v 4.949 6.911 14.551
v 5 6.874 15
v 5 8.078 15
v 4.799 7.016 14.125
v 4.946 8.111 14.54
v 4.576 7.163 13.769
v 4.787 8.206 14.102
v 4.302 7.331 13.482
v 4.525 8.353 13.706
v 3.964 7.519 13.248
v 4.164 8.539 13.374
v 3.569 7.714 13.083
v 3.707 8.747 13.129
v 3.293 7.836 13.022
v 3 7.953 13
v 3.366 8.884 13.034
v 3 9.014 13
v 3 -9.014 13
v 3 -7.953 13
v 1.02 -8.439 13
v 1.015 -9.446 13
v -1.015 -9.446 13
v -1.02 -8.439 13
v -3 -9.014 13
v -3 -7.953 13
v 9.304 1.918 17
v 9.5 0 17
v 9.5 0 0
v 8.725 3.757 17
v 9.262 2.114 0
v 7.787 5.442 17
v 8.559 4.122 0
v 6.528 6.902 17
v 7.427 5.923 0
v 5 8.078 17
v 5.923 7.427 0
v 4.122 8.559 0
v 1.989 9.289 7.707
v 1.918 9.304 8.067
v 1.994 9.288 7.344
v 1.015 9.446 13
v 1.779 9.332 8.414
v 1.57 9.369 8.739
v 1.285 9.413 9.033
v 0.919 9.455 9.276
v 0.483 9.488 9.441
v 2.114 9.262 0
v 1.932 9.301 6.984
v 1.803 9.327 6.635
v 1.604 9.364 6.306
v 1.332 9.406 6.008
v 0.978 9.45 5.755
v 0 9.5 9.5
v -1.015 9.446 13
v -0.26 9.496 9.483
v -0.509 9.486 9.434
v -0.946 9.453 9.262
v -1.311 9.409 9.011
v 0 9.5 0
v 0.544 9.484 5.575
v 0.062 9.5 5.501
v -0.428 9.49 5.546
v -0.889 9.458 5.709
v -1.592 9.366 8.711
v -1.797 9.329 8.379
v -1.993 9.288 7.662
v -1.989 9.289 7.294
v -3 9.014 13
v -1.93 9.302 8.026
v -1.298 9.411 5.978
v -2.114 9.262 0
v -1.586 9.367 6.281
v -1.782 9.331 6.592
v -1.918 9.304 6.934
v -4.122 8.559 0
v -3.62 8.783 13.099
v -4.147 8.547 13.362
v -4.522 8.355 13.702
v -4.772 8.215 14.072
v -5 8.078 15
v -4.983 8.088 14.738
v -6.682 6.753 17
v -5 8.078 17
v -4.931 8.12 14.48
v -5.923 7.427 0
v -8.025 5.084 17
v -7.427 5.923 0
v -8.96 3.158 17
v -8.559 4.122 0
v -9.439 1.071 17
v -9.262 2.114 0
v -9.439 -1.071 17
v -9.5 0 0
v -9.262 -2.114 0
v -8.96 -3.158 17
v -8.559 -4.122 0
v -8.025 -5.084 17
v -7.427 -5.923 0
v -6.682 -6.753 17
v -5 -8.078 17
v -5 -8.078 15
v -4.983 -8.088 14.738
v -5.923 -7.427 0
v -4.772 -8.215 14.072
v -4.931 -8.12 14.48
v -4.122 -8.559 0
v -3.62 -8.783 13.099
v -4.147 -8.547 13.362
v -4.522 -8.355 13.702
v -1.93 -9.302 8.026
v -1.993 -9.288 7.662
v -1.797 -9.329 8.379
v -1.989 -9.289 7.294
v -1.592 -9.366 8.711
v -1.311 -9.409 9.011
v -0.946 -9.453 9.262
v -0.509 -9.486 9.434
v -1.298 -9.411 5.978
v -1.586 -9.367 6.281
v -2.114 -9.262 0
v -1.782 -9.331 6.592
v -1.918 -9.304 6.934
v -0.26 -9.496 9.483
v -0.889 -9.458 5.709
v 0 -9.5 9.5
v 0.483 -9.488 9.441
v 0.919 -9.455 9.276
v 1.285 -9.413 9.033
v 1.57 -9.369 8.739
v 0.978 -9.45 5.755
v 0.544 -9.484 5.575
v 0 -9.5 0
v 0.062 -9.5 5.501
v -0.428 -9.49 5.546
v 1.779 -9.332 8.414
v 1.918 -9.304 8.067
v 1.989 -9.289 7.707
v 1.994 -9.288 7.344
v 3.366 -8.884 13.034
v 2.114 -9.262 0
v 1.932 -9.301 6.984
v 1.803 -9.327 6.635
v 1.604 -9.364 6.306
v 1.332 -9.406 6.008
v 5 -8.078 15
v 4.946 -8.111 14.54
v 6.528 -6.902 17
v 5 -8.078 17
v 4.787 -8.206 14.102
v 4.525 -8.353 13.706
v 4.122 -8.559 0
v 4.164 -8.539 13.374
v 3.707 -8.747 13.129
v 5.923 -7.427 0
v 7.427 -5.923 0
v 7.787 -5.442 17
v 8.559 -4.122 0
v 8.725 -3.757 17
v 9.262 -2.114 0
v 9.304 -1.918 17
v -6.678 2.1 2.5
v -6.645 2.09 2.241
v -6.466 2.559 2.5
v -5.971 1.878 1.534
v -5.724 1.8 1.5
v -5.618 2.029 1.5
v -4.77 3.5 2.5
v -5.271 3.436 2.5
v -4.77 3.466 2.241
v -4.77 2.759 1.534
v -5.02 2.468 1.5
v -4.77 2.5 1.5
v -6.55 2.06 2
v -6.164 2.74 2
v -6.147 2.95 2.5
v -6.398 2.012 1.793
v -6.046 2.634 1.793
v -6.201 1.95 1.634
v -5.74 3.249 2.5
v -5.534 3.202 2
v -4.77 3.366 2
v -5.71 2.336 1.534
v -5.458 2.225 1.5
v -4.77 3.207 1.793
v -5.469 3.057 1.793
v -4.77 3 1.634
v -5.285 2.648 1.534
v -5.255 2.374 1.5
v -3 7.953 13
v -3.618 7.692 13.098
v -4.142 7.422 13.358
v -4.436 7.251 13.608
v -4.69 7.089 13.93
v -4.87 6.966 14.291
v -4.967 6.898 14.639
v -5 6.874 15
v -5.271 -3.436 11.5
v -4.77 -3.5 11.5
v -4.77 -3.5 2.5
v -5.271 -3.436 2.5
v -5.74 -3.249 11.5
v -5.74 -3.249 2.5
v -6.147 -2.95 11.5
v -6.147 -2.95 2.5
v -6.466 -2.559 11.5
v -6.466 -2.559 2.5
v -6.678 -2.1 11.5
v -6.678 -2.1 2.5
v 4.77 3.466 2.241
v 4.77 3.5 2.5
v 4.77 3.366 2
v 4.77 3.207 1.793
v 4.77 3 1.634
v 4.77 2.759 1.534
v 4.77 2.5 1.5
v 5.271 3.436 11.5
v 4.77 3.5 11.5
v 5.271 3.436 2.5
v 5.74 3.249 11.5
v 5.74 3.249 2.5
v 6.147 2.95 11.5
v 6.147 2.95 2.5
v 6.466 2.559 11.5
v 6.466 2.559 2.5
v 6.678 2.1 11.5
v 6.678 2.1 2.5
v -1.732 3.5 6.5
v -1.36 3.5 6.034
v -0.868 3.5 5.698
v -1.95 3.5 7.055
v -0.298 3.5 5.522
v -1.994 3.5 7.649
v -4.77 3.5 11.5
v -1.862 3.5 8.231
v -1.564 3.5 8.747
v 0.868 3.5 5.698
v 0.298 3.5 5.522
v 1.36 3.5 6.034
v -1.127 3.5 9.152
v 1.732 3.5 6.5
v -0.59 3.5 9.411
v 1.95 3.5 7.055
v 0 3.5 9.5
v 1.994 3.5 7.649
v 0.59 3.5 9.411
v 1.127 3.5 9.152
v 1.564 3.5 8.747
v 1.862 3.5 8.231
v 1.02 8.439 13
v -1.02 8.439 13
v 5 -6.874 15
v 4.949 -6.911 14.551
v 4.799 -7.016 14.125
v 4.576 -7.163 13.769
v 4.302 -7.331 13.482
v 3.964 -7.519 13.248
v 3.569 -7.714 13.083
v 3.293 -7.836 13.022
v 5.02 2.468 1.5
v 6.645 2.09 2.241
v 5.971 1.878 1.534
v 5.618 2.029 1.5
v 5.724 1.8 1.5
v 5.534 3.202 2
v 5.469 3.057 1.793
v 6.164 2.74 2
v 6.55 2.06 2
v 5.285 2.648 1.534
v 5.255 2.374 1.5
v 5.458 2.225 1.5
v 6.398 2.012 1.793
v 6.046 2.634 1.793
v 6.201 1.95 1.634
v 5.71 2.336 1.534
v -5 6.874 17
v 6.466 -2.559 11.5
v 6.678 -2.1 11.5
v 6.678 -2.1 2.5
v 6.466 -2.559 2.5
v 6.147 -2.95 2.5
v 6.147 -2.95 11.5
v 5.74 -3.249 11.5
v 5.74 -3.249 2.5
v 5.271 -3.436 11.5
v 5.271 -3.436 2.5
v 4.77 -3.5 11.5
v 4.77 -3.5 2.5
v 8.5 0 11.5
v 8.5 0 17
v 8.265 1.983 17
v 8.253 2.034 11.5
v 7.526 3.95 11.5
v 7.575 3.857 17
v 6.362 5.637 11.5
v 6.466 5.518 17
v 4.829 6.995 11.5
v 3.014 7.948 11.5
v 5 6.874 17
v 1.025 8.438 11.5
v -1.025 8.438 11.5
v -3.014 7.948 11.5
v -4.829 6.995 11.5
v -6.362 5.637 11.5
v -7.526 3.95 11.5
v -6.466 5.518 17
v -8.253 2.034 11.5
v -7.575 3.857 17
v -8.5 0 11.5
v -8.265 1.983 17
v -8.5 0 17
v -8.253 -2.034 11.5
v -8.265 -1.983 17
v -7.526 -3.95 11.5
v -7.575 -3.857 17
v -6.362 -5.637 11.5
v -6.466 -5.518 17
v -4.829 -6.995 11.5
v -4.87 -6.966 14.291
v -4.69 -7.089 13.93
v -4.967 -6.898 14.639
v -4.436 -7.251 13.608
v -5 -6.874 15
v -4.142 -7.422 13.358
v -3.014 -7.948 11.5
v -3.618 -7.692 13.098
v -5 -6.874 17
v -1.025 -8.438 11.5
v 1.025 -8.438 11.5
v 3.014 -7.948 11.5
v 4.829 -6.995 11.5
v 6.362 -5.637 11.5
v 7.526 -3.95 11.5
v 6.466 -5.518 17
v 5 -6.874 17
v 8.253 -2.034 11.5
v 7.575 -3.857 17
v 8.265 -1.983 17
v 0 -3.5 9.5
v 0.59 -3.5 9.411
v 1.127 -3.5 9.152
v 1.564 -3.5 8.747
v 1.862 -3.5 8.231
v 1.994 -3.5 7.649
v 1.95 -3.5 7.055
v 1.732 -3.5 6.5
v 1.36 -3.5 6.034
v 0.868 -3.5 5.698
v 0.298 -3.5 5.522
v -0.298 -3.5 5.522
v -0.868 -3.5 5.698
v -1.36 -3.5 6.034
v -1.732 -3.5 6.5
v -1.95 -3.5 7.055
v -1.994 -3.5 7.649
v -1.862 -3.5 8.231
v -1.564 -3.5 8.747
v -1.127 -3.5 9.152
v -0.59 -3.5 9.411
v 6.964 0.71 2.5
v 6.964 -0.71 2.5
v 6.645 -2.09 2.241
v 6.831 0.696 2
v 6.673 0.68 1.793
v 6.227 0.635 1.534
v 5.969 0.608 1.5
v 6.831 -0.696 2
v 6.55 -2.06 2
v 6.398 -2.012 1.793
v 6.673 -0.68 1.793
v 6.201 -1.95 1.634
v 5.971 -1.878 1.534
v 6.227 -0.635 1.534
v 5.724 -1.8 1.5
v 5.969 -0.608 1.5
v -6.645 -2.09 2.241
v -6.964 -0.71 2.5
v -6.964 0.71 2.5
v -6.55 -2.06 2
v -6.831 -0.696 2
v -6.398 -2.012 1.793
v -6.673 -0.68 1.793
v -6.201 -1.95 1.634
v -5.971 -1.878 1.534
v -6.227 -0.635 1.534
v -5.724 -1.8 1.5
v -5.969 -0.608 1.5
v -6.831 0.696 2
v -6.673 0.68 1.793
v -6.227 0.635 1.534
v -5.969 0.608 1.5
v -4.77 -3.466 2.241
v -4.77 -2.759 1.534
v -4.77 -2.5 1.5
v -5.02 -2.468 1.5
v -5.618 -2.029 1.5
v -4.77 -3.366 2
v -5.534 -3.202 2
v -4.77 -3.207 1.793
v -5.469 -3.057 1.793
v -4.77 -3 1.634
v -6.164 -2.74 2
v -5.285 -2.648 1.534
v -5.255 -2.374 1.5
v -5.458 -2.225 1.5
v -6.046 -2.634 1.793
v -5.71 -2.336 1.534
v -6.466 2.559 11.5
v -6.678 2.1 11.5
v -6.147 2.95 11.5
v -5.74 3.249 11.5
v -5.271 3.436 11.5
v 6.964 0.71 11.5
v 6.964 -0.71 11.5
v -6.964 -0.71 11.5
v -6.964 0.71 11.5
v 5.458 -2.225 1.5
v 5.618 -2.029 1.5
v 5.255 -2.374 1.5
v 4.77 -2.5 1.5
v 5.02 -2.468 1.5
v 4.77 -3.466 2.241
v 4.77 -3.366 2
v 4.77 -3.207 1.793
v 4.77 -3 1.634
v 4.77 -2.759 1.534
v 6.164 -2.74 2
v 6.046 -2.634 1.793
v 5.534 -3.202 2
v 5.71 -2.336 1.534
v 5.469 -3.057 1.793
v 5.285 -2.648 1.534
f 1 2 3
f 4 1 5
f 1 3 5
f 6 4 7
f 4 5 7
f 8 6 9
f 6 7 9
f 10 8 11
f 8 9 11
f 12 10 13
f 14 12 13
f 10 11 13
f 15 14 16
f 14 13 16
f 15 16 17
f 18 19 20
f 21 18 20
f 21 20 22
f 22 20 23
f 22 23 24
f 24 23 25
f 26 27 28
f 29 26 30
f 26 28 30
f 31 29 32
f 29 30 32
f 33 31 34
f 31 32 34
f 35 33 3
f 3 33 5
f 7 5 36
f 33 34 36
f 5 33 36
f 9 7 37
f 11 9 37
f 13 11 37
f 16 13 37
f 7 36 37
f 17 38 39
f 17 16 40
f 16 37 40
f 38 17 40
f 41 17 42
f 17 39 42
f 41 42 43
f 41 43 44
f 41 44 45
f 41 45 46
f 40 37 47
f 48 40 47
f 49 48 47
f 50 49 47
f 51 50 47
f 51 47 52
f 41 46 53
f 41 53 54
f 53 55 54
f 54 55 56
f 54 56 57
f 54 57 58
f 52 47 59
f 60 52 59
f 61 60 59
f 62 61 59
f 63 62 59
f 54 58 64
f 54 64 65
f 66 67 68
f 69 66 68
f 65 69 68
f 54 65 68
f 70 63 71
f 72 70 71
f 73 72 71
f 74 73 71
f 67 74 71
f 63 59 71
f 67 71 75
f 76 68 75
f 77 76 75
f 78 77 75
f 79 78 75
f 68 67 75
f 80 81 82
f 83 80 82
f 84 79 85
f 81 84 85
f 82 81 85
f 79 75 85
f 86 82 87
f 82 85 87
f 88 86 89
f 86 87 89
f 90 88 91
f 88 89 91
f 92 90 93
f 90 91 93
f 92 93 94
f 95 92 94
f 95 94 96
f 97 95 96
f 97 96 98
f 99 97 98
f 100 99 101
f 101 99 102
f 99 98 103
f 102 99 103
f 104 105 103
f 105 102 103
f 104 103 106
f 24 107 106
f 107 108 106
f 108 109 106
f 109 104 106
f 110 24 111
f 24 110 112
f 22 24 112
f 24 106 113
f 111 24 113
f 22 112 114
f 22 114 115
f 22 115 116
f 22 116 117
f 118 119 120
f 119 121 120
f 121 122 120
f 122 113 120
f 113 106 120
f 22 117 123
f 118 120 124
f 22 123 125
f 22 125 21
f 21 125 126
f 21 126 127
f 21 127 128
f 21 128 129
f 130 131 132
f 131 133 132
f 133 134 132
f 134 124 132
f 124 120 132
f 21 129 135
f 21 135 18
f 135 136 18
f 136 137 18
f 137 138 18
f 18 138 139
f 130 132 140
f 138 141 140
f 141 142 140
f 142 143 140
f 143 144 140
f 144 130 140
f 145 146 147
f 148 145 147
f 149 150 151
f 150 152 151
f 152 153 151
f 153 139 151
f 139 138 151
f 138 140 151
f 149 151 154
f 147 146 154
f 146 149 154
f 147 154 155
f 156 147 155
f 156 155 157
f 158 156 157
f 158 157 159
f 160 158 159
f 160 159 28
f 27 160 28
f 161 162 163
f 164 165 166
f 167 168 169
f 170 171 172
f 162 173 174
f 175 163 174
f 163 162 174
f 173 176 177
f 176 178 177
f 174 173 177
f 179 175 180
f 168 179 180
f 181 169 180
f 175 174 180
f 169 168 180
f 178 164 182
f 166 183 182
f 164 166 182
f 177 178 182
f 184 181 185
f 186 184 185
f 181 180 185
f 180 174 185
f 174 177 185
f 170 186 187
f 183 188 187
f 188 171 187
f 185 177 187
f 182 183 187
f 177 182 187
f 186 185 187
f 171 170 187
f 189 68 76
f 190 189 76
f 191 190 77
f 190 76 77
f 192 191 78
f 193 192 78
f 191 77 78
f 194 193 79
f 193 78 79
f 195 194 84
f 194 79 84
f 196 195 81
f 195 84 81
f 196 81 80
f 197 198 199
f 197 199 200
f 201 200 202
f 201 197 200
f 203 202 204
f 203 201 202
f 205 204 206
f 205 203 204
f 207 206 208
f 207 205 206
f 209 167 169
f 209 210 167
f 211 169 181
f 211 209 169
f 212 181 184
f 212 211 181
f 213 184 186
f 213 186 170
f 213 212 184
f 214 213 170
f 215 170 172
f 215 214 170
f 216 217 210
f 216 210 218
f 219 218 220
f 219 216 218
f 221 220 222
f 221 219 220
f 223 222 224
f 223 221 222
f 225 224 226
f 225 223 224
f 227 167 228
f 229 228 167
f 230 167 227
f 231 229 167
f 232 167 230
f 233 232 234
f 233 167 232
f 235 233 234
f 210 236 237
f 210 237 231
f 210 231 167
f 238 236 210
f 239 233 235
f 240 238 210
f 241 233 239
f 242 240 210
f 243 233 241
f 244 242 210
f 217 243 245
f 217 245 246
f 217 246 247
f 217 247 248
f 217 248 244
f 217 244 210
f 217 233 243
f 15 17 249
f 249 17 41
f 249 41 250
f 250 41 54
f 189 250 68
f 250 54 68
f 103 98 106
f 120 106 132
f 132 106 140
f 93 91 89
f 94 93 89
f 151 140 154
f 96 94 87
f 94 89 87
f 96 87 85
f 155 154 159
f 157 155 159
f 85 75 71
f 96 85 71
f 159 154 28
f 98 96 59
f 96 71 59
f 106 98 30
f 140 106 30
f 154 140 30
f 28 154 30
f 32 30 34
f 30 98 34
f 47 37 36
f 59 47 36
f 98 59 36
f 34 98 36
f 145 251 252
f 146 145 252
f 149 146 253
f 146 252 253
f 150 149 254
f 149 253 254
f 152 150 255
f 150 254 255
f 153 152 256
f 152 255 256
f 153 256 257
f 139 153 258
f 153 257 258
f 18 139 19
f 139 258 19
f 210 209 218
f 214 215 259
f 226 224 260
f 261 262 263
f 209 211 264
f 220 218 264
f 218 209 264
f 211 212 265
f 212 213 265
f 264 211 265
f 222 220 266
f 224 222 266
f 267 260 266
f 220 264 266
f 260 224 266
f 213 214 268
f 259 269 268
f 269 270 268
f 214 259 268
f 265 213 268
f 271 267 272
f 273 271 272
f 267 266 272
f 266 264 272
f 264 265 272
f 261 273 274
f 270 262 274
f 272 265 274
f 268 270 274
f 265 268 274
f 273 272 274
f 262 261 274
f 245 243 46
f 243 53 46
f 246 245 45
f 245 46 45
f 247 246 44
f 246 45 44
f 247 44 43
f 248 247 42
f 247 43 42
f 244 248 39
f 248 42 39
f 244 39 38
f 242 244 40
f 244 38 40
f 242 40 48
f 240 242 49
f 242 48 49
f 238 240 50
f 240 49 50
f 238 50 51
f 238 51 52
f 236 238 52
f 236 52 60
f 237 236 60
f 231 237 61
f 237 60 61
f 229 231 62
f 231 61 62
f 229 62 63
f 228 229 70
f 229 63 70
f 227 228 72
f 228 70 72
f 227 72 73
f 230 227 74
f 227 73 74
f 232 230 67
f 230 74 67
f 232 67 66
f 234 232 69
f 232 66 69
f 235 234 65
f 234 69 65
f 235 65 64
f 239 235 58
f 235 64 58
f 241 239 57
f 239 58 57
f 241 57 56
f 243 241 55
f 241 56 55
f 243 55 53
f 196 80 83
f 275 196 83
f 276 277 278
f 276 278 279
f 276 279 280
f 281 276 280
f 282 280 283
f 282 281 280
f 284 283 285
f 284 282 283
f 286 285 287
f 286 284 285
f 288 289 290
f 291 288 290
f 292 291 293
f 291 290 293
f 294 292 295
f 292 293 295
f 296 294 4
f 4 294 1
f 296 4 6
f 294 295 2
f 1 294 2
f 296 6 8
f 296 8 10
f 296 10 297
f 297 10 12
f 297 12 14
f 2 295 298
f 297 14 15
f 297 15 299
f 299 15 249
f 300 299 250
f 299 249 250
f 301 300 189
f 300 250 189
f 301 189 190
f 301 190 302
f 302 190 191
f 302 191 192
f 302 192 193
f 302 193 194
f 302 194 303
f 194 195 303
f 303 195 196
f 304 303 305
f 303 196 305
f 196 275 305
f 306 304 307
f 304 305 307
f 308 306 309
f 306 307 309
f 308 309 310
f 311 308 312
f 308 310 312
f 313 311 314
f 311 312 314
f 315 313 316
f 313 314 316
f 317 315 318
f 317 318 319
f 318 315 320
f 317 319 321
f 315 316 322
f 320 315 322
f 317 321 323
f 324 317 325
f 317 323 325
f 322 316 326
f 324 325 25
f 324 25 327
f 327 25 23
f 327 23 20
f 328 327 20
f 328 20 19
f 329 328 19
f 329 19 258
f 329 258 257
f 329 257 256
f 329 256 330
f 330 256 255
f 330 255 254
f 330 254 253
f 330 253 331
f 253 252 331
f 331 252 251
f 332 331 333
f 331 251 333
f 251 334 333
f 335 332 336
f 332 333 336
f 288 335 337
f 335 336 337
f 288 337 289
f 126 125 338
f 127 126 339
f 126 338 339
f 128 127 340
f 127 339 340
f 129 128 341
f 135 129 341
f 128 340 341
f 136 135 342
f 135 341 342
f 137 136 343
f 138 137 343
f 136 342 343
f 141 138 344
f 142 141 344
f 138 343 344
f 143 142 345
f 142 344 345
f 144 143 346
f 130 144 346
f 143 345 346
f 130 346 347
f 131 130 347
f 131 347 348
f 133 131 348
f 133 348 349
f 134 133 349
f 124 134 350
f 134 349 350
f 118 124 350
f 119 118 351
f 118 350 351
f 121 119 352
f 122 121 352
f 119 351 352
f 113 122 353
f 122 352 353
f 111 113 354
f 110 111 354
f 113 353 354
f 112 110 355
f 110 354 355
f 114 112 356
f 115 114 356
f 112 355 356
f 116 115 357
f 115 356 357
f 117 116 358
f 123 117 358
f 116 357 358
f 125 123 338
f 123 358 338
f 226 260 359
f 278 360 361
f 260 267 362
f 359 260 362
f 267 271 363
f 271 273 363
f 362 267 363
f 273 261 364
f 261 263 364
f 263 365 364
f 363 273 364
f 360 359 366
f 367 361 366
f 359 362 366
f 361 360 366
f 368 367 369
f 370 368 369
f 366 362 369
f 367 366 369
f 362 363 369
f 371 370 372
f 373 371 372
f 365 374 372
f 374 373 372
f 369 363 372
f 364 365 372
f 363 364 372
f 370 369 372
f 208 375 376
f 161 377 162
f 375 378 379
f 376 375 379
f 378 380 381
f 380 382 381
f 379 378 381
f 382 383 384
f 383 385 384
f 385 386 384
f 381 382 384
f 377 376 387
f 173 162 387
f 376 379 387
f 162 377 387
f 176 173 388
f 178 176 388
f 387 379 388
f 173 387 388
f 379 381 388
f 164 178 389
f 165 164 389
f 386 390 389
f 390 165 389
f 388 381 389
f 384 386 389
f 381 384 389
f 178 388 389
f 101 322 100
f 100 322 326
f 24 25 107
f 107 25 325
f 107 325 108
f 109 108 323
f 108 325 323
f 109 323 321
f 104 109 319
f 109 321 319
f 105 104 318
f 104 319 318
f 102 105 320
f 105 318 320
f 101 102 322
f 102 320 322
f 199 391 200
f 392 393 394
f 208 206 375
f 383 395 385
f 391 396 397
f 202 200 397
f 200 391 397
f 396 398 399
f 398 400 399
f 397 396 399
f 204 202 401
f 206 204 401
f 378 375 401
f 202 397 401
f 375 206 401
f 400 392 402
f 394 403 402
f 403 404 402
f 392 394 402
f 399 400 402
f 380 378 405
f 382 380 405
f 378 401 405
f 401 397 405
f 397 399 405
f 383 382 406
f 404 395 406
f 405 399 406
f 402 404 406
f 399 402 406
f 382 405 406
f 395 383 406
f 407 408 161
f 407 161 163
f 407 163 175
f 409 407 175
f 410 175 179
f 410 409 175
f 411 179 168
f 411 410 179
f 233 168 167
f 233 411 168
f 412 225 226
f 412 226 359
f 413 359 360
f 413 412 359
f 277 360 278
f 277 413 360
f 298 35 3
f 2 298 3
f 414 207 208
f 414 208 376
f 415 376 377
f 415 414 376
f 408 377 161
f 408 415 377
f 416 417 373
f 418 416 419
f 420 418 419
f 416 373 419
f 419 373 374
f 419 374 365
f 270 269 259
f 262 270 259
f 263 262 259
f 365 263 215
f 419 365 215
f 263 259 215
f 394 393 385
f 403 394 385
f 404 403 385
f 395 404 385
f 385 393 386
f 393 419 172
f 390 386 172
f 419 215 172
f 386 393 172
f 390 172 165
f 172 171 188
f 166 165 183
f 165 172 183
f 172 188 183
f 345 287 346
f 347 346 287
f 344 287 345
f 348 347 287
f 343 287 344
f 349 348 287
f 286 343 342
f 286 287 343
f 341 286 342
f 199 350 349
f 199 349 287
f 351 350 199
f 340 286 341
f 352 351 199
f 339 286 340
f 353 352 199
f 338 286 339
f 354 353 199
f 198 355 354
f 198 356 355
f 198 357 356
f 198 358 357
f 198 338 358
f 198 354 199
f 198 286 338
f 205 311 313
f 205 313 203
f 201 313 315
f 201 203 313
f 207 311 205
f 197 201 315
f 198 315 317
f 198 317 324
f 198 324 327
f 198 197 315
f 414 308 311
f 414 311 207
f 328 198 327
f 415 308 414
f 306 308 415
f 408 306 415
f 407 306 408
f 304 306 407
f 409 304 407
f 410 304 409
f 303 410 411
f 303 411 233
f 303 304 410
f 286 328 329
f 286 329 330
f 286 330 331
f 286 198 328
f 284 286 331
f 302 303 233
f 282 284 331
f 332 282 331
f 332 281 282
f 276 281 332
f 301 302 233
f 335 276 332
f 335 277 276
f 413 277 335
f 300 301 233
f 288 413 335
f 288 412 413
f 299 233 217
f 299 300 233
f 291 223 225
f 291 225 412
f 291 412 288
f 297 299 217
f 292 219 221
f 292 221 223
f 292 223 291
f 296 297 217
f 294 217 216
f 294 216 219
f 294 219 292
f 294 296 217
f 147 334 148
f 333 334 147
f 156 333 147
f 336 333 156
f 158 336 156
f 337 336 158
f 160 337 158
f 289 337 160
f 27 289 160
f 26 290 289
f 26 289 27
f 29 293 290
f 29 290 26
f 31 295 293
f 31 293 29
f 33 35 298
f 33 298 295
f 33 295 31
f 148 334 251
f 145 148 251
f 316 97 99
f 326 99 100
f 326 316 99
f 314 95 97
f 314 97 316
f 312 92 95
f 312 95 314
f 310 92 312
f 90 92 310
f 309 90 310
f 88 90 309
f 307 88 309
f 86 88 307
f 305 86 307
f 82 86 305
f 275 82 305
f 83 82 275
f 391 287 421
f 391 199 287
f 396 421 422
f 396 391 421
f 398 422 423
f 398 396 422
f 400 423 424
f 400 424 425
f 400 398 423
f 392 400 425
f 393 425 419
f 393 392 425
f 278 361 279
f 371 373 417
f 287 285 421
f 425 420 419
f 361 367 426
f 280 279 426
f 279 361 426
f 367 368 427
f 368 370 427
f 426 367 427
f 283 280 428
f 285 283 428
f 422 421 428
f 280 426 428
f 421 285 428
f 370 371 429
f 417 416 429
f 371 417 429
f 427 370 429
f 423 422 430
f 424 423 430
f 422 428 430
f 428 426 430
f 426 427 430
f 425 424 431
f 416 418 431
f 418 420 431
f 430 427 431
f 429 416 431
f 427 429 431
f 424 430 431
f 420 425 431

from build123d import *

# Parameters (mm, degrees)
ESQUISSE1_R             = 9.5
BASE_EXTRUSION_DEPTH    = 17
ESQUISSE2_R             = 8.5
ENL_V_MAT_EXTRU_1_DEPTH = 5.5
ESQUISSE3_R             = 2
ENL_V_MAT_EXTRU_2_DEPTH = 15
ENL_V_MAT_EXTRU_3_DEPTH = 10
CONG_1_R                = 1


with BuildPart() as part:
    # Esquisse1 → Base-Extrusion (new body)
    with BuildSketch(Plane.XY):
        Circle(ESQUISSE1_R)
    extrude(amount=BASE_EXTRUSION_DEPTH)

    # Esquisse2 → Enlèv. mat.-Extru.1 (cut)
    with BuildSketch(Plane.XY.offset(17)):
        Circle(ESQUISSE2_R)
    extrude(amount=-ENL_V_MAT_EXTRU_1_DEPTH, mode=Mode.SUBTRACT)

    # Esquisse3 → Enlèv. mat.-Extru.2 (cut, symmetric)
    with BuildSketch(Plane(origin=(0, 0, 0), x_dir=(1, 0, 0), z_dir=(0, 1, 0))):
        with Locations(Location((0, -7.5, 0), (0, 0, 270))):
            Circle(ESQUISSE3_R)
        with BuildLine():
            Line((-5, -17), (5, -17))
            Line((5, -17), (5, -15))
            ThreePointArc((5, -15), (4.414213562, -13.585786438), (3, -13))
            Line((3, -13), (-3, -13))
            ThreePointArc((-3, -13), (-4.414213562, -13.585786438), (-5, -15))
            Line((-5, -15), (-5, -17))
        make_face()
    extrude(amount=ENL_V_MAT_EXTRU_2_DEPTH, both=True, mode=Mode.SUBTRACT)

    # Esquisse4 → Enlèv. mat.-Extru.3 (cut)
    with BuildSketch(Plane.XY.offset(11.5)):
        with BuildLine():
            Line((-4.769696007, 3.5), (4.769696007, 3.5))
            ThreePointArc((4.769696007, 3.5), (5.952911964, 3.11245155), (6.67757441, 2.1))
            ThreePointArc((6.67757441, 2.1), (7, 0), (6.67757441, -2.1))
            ThreePointArc((6.67757441, -2.1), (5.952911964, -3.11245155), (4.769696007, -3.5))
            Line((4.769696007, -3.5), (-4.769696007, -3.5))
            ThreePointArc((-4.769696007, -3.5), (-5.952911964, -3.11245155), (-6.67757441, -2.1))
            ThreePointArc((-6.67757441, -2.1), (-7, 0), (-6.67757441, 2.1))
            ThreePointArc((-6.67757441, 2.1), (-5.952911964, 3.11245155), (-4.769696007, 3.5))
        make_face()
    extrude(amount=-ENL_V_MAT_EXTRU_3_DEPTH, mode=Mode.SUBTRACT)

    # Congé1
    cong_1_edges = [part.edges().sort_by_distance(p)[0] for p in [
        (0, 3.5, 1.5),
        (0, -3.5, 1.5),
        (-5.952911964, 3.11245155, 1.5),
        (5.952911964, 3.11245155, 1.5),
        (7, 0, 1.5),
        (5.952911964, -3.11245155, 1.5),
        (-5.952911964, -3.11245155, 1.5),
        (-7, 0, 1.5),
    ]]
    fillet(cong_1_edges, radius=CONG_1_R)


solid = part.part
